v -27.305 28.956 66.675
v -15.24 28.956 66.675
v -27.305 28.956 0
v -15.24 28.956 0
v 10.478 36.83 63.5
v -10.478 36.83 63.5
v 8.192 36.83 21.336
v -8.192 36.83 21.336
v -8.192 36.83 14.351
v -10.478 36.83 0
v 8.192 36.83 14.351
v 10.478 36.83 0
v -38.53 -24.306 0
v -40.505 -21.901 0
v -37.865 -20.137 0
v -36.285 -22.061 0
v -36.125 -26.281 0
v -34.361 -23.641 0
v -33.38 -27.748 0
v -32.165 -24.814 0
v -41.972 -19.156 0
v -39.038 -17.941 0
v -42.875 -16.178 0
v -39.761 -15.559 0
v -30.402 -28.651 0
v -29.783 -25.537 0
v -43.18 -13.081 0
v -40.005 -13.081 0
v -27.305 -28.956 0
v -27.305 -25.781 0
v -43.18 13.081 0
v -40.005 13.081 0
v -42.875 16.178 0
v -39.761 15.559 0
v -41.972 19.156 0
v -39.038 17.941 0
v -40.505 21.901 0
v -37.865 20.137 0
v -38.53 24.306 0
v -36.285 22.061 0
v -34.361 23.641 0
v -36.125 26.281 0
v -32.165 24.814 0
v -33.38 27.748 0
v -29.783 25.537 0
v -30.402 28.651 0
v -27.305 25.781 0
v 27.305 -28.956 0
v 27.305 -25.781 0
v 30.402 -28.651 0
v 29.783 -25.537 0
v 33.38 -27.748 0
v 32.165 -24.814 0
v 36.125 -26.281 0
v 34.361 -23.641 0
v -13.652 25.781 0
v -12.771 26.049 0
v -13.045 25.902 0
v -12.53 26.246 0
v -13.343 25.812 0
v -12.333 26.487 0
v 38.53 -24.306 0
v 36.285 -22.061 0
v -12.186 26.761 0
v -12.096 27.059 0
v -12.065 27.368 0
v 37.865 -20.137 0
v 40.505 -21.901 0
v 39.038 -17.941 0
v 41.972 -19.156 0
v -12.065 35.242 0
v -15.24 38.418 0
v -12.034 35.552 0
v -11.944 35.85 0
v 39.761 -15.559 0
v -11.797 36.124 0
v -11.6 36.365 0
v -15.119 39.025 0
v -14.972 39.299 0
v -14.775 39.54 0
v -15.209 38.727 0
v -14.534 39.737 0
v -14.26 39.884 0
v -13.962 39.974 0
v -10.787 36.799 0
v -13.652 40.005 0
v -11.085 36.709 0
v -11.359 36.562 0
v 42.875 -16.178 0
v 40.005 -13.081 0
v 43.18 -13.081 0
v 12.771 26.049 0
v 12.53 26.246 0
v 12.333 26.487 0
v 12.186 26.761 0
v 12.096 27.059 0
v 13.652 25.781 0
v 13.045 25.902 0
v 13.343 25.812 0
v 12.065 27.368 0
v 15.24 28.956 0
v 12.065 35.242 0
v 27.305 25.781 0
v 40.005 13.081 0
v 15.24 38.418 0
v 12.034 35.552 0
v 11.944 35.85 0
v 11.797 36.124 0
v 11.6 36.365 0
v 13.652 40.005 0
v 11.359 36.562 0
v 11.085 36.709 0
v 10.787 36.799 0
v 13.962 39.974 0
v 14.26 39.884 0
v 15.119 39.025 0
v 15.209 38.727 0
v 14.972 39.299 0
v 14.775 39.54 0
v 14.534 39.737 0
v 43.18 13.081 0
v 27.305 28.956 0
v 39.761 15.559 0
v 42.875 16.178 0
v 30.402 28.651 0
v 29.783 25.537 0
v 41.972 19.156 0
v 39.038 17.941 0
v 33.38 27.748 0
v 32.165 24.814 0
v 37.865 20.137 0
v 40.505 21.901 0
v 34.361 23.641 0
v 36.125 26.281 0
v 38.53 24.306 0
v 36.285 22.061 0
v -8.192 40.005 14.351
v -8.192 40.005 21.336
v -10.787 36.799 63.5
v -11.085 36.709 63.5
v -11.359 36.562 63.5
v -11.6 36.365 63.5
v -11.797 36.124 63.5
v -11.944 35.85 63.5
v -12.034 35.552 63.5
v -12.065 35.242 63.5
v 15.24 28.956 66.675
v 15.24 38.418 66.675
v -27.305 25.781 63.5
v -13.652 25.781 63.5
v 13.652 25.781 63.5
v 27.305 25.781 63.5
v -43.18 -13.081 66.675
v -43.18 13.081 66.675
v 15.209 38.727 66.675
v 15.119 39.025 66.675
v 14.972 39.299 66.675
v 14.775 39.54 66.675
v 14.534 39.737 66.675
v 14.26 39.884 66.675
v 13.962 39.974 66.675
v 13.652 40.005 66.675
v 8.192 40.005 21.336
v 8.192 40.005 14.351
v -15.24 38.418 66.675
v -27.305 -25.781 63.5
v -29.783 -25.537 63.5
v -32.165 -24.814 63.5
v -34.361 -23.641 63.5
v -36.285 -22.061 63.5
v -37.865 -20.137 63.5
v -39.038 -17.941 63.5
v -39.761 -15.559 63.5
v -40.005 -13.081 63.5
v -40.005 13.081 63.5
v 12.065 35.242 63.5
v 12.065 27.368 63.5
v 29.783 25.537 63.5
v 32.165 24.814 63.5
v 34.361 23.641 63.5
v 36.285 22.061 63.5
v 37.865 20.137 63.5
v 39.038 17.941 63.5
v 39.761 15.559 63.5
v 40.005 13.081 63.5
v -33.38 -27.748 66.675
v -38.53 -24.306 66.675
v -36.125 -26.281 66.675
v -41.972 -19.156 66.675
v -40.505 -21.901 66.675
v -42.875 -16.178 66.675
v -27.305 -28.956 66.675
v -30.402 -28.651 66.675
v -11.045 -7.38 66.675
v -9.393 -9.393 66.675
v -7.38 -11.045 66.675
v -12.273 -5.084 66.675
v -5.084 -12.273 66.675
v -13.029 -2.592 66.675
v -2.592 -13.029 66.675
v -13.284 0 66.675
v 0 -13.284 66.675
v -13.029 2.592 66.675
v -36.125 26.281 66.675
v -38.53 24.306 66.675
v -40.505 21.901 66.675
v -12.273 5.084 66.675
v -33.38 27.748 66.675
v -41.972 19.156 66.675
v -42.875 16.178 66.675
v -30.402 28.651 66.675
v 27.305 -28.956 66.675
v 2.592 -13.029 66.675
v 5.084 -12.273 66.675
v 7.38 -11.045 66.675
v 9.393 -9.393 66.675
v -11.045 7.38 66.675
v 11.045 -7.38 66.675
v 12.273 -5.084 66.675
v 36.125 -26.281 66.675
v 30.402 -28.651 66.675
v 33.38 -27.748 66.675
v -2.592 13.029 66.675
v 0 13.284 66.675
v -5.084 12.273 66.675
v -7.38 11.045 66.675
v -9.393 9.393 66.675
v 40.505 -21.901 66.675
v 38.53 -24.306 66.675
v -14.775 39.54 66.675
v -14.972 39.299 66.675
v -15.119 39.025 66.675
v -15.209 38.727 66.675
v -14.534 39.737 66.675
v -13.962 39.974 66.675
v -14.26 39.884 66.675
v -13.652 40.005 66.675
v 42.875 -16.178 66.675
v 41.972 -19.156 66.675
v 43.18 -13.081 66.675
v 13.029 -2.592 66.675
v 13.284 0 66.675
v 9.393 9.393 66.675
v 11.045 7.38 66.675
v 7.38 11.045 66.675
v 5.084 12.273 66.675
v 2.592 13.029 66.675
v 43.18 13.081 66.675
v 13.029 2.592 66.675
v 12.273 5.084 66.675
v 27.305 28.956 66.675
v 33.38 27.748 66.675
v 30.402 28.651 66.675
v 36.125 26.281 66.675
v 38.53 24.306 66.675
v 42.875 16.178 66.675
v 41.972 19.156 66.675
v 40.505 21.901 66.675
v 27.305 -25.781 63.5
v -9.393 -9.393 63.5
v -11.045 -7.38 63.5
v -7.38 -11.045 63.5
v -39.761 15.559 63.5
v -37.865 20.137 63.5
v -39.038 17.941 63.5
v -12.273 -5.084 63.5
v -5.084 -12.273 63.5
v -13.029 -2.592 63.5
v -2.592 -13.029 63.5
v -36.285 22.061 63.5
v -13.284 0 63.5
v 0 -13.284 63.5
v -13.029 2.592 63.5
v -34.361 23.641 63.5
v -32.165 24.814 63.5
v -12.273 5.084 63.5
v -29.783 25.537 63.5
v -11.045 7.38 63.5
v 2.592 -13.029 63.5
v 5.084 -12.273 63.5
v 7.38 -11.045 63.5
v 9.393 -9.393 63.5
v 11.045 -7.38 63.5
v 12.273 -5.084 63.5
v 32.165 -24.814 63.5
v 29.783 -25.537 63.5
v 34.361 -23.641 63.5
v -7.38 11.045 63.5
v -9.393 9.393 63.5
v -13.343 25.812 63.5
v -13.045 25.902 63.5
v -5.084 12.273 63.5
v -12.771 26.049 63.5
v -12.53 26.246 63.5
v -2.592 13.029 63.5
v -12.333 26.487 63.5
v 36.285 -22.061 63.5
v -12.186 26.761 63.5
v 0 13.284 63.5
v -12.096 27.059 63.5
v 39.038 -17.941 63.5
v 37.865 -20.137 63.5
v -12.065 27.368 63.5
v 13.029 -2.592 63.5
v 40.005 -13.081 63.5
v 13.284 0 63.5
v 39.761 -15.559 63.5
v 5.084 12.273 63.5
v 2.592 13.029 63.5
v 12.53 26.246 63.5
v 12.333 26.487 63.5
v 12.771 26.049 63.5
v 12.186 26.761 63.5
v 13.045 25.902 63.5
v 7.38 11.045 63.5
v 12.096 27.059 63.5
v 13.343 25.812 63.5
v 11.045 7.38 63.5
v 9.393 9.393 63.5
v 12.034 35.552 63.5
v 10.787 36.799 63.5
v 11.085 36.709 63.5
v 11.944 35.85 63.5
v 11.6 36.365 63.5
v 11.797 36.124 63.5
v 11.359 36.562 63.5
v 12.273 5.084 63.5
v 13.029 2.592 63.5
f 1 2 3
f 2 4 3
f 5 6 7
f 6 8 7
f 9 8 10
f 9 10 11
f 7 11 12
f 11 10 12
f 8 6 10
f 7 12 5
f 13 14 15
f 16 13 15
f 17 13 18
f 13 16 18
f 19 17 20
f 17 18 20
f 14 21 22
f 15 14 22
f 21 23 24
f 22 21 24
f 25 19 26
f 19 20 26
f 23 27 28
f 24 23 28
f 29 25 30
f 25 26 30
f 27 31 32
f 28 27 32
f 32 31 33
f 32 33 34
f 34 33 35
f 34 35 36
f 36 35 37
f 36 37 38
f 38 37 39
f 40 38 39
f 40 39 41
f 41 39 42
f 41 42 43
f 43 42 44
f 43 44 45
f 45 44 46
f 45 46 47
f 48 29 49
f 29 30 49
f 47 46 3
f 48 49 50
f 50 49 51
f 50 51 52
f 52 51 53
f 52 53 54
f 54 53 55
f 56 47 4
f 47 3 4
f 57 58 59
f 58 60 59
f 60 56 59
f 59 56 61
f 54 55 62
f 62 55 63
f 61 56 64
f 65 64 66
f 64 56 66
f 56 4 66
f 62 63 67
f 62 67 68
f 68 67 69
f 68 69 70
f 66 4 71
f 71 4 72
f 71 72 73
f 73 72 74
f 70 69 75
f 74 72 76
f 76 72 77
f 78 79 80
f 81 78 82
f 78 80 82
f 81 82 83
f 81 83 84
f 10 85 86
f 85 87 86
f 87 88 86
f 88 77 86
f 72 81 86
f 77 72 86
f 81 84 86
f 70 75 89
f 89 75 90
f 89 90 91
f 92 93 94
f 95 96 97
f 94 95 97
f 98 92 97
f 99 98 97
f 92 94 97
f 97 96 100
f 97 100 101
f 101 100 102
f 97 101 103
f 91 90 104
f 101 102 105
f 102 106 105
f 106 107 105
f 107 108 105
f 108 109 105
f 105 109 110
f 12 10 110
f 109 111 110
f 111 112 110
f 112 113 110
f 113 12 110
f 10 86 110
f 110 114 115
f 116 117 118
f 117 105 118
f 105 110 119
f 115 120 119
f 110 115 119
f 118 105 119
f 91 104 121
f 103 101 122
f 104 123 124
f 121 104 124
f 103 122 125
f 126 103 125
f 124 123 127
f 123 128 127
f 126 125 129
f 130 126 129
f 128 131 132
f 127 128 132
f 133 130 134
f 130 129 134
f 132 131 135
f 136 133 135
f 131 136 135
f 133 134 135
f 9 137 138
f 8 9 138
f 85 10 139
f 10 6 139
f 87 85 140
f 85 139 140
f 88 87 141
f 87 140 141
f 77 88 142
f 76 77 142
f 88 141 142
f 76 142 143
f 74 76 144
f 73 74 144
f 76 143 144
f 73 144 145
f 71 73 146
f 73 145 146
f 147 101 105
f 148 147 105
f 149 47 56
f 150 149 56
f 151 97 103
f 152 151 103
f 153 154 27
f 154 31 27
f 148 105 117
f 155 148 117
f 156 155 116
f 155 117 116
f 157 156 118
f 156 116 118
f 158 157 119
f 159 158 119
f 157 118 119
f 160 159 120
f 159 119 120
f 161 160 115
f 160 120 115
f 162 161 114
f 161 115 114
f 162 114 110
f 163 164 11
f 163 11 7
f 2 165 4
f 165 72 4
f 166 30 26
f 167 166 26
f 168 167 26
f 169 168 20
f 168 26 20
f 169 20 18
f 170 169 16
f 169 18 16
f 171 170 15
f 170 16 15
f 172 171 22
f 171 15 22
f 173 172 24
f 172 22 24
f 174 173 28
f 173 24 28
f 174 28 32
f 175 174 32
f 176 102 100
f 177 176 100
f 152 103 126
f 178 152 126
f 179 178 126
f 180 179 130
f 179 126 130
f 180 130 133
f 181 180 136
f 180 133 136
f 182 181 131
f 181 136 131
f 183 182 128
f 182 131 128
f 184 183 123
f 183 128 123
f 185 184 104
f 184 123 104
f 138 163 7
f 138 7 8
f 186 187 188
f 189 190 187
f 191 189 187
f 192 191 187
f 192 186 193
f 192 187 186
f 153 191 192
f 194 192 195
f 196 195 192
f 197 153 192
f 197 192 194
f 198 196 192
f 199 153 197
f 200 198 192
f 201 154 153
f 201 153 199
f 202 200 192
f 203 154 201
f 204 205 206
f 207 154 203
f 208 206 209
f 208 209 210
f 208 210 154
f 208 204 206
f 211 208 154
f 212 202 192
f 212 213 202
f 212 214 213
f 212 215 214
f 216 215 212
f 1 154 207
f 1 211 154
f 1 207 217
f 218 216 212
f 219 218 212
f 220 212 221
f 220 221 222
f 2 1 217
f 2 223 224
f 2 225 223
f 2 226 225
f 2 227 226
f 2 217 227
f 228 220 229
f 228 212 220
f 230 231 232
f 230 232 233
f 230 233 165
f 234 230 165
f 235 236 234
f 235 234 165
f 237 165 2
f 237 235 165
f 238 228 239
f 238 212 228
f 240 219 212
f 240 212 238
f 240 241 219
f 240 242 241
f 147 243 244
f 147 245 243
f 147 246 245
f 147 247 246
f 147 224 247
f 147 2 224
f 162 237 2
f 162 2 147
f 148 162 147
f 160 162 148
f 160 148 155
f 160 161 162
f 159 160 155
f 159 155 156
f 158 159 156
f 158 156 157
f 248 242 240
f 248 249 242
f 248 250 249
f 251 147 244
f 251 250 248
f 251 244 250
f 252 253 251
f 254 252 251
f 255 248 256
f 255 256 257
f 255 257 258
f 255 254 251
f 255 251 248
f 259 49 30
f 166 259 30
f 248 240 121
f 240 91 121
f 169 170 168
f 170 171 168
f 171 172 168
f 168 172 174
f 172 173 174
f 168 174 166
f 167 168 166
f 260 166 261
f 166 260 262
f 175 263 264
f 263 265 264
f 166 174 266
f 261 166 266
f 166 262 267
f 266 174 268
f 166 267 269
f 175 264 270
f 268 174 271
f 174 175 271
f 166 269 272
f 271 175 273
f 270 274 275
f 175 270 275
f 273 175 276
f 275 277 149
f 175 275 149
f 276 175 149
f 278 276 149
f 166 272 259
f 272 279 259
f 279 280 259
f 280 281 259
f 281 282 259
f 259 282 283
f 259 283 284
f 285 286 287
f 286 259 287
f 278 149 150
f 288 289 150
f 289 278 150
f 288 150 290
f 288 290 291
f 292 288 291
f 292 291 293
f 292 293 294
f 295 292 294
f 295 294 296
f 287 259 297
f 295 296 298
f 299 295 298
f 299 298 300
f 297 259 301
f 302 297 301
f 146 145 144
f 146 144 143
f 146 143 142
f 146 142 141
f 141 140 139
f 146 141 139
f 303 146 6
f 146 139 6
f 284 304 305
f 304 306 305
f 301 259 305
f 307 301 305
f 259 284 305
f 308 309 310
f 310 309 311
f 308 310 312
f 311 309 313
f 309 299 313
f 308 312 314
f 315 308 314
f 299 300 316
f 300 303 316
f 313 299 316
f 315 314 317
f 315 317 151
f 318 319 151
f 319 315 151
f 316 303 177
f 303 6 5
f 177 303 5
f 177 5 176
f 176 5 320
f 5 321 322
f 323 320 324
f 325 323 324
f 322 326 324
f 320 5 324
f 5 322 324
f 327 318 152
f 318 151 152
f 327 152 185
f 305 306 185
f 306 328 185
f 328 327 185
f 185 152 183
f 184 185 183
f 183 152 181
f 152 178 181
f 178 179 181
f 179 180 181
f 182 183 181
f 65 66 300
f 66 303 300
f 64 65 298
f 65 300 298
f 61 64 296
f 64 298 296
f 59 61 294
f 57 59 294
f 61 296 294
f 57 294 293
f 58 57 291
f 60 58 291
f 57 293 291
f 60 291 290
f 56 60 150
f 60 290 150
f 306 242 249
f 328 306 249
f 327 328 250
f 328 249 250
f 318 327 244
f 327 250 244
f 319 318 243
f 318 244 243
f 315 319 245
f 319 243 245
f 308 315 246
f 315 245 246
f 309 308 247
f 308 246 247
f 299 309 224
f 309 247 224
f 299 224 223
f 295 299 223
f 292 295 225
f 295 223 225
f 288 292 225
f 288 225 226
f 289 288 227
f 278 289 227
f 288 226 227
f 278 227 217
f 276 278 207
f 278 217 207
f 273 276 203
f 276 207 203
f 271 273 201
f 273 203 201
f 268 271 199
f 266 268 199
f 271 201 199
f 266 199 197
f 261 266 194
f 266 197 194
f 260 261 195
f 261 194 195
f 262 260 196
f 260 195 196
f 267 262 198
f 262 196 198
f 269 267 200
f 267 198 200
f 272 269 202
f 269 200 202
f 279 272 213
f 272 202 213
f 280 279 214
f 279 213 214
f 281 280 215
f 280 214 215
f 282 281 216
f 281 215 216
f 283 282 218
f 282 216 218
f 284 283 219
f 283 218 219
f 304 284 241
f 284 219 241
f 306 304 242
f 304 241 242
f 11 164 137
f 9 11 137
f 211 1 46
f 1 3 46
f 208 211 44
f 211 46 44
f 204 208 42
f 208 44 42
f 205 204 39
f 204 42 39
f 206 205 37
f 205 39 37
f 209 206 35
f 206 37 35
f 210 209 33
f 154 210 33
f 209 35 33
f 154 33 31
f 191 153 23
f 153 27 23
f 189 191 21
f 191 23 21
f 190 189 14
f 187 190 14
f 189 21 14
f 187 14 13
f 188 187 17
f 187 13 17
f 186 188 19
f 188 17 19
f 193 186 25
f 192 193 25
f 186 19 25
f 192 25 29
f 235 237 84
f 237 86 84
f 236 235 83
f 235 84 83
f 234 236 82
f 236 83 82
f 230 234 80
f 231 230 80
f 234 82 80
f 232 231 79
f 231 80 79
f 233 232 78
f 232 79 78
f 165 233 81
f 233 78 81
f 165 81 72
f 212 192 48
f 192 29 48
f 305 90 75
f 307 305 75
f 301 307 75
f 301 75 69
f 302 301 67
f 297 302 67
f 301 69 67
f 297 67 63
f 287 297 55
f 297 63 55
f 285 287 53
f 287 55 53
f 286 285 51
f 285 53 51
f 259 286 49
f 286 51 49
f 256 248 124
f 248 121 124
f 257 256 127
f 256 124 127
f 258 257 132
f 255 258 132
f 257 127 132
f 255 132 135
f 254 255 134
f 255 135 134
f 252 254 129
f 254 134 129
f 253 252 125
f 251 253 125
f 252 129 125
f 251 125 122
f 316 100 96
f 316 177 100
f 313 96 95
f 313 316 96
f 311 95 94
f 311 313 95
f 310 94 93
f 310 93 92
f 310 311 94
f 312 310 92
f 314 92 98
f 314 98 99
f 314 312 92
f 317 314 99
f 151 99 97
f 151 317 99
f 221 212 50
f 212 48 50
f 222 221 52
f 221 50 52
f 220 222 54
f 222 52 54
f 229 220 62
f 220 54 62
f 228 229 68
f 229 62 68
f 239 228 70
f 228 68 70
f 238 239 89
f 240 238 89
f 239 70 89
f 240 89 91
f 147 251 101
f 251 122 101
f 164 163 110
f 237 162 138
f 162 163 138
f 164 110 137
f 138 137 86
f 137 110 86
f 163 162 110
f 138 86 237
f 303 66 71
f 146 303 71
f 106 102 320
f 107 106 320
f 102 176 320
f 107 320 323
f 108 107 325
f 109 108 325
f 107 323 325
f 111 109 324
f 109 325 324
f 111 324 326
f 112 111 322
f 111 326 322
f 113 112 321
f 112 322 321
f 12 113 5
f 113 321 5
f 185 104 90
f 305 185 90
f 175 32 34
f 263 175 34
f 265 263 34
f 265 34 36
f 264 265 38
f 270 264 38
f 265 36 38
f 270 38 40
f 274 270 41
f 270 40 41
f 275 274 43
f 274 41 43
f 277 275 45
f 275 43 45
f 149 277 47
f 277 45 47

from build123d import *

# Parameters (mm, degrees)
F1_DEPTH = 63.5
F2_W     = 16.383
F2_H     = 6.985
F3_DEPTH = 3.175
F4_R     = 1.5875
F6_DEPTH = 3.175
F7_R     = 13.2842
F8_DEPTH = 3.175


with BuildPart() as f1:
    # F0 (on Top) → F1 (new body)
    with BuildSketch(Plane.XY):
        with BuildLine():
            Line((-15.24, 40.005), (-15.24, 28.956))
            Line((-15.24, 28.956), (-27.305, 28.956))
            ThreePointArc((-27.305, 28.956), (-38.53032, 24.30632), (-43.18, 13.081))
            Line((-43.18, 13.081), (-43.18, -13.081))
            ThreePointArc((-43.18, -13.081), (-38.53032, -24.30632), (-27.305, -28.956))
            Line((-27.305, -28.956), (27.305, -28.956))
            ThreePointArc((27.305, -28.956), (38.53032, -24.30632), (43.18, -13.081))
            Line((43.18, -13.081), (43.18, 13.081))
            ThreePointArc((43.18, 13.081), (38.53032, 24.30632), (27.305, 28.956))
            Line((27.305, 28.956), (15.24, 28.956))
            Line((15.24, 28.956), (15.24, 40.005))
            Line((15.24, 40.005), (-15.24, 40.005))
        make_face()
        with BuildLine():
            Line((12.065, 25.781), (27.305, 25.781))
            ThreePointArc((27.305, 25.781), (36.285256, 22.061256), (40.005, 13.081))
            Line((40.005, 13.081), (40.005, -13.081))
            ThreePointArc((40.005, -13.081), (36.285256, -22.061256), (27.305, -25.781))
            Line((27.305, -25.781), (-27.305, -25.781))
            ThreePointArc((-27.305, -25.781), (-36.285256, -22.061256), (-40.005, -13.081))
            Line((-40.005, -13.081), (-40.005, 13.081))
            ThreePointArc((-40.005, 13.081), (-36.285256, 22.061256), (-27.305, 25.781))
            Line((-27.305, 25.781), (-12.065, 25.781))
            Line((-12.065, 25.781), (-12.065, 36.83))
            Line((-12.065, 36.83), (12.065, 36.83))
            Line((12.065, 36.83), (12.065, 25.781))
        make_face(mode=Mode.SUBTRACT)
    extrude(amount=F1_DEPTH)

    # F2 (on face) → F3 (cut, through all)
    with BuildSketch(Plane(origin=(0, 40.005, 0), x_dir=(-1, 0, 0), z_dir=(0, 1, 0))):
        with Locations((0, 17.8435)):
            Rectangle(F2_W, F2_H)
    extrude(amount=-F3_DEPTH, mode=Mode.SUBTRACT)

    # F4
    f4_edges = [f1.edges().sort_by_distance(p)[0] for p in [
        (-12.065, 25.781, 31.75),
        (-12.065, 36.83, 31.75),
        (12.065, 25.781, 31.75),
        (12.065, 36.83, 31.75),
        (15.24, 40.005, 31.75),
        (-15.24, 40.005, 31.75),
    ]]
    fillet(f4_edges, radius=F4_R)

    # F5 (on face) → F6 (join)
    with BuildSketch(Plane.XY.offset(63.5)):
        with BuildLine():
            Line((13.6525, 40.005), (-13.6525, 40.005))
            ThreePointArc((-13.6525, 40.005), (-14.775032, 39.540032), (-15.24, 38.4175))
            Line((-15.24, 38.4175), (-15.24, 28.956))
            Line((-15.24, 28.956), (-27.305, 28.956))
            ThreePointArc((-27.305, 28.956), (-38.53032, 24.30632), (-43.18, 13.081))
            Line((-43.18, 13.081), (-43.18, -13.081))
            ThreePointArc((-43.18, -13.081), (-38.53032, -24.30632), (-27.305, -28.956))
            Line((-27.305, -28.956), (27.305, -28.956))
            ThreePointArc((27.305, -28.956), (38.53032, -24.30632), (43.18, -13.081))
            Line((43.18, -13.081), (43.18, 13.081))
            ThreePointArc((43.18, 13.081), (38.53032, 24.30632), (27.305, 28.956))
            Line((27.305, 28.956), (15.24, 28.956))
            Line((15.24, 28.956), (15.24, 38.4175))
            ThreePointArc((15.24, 38.4175), (14.775032, 39.540032), (13.6525, 40.005))
        make_face()
    extrude(amount=F6_DEPTH)

    # F7 (on face) → F8 (cut, through all)
    with BuildSketch(Plane.XY.offset(66.675)):
        Circle(F7_R)
    extrude(amount=-F8_DEPTH, mode=Mode.SUBTRACT)


with BuildPart() as f9_1:
    # F9: copy of F1
    add(f1.part)


solid = f1.part
